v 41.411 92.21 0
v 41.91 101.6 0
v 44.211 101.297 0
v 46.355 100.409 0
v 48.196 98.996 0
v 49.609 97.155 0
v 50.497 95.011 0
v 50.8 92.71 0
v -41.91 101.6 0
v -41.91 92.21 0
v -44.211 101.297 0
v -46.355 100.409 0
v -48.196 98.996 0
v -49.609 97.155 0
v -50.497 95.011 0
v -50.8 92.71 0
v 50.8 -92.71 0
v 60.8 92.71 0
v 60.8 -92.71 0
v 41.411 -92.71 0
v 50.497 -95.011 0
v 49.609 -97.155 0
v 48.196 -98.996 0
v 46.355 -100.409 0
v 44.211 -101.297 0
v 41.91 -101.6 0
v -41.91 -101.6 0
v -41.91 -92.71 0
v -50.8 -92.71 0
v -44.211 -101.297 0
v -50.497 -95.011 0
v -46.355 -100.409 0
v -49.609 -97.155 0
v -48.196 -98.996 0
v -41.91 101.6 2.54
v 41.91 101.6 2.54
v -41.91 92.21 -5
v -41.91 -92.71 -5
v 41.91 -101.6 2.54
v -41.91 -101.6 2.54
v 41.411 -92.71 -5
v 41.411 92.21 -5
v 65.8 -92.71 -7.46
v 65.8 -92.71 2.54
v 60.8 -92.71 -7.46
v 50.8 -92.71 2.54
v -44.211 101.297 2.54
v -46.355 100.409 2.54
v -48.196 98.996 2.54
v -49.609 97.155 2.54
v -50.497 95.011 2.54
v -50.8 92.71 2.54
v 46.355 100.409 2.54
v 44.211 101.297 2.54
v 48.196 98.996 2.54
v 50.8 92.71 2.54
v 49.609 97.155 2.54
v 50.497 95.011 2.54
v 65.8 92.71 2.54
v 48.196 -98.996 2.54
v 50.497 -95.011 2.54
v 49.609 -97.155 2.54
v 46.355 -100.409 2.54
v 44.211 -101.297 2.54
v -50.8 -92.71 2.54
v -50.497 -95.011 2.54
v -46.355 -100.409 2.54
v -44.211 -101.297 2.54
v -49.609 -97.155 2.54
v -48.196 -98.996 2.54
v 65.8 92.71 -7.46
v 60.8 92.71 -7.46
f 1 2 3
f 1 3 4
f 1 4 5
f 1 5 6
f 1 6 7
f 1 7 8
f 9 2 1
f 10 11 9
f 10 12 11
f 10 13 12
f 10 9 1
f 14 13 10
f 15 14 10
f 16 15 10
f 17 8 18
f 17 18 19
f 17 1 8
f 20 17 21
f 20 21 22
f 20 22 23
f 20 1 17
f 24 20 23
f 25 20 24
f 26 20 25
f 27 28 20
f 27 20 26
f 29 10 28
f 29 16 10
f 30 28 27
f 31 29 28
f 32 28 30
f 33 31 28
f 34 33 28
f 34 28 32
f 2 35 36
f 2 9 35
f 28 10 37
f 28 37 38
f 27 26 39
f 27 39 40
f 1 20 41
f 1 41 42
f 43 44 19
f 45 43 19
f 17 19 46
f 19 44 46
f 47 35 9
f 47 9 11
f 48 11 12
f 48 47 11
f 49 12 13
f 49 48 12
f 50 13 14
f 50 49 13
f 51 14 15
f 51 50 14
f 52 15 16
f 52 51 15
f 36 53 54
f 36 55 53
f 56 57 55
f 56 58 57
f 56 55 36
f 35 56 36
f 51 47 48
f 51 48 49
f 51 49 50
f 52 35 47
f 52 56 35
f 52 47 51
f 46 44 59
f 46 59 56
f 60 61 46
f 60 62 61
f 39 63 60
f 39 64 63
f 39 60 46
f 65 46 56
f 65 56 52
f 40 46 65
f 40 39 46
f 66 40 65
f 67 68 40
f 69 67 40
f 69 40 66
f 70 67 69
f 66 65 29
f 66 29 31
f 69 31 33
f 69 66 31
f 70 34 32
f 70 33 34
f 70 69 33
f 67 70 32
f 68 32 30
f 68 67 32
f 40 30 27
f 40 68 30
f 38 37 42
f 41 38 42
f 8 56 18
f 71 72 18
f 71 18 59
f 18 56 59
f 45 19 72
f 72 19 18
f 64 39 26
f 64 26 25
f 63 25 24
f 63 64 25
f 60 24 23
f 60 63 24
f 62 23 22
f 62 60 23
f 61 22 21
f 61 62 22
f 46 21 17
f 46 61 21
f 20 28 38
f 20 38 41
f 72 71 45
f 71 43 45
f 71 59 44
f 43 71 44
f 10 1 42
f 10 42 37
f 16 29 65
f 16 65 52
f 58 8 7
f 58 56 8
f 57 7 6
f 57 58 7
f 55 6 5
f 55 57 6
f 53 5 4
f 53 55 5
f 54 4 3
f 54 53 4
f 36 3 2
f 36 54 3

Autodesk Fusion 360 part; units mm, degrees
sketch "Sketch1" plane through (0, 0, 0) normal (0, 0, 1) x (1, 0, 0)
  line L0 (-50.8, 101.6) -> (50.8, 101.6)
  line L1 (50.8, 101.6) -> (50.8, -101.6)
  line L2 (50.8, -101.6) -> (-50.8, -101.6)
  line L3 (-50.8, -101.6) -> (-50.8, 101.6)
  line L4 (-50.8, 101.6) -> (50.8, -101.6) construction
  line L5 (50.8, 101.6) -> (-50.8, -101.6) construction
  dimension "d1" = 101.6
  dimension "d2" = 203.2
extrude "Extrude1" add sketch "Sketch1" along normal blind 2.54
fillet "Fillet1" radius 8.89 4 edges at (-50.8, -101.6, 1.27) (50.8, -101.6, 1.27) (50.8, 101.6, 1.27) (-50.8, 101.6, 1.27)
extrude "Extrude4" add 1 faces at (50.8, 30.9033, 0.8467) along direction (1, 0, 0) blind 10
sketch "Sketch3" plane through (0, 0, 2.54) normal (0, 0, 1) x (-1, 0, 0)
  arc A0 (41.91, -101.6) -> (50.8, -92.71) centre (41.91, -92.71) ccw
  line L0 (50.8, -92.71) -> (50.8, 92.71)
  arc A1 (50.8, 92.71) -> (41.91, 101.6) centre (41.91, 92.71) ccw
  line L1 (41.91, 101.6) -> (-41.91, 101.6)
  arc A2 (-41.91, 101.6) -> (-50.8, 92.71) centre (-41.91, 92.71) ccw
  line L2 (-50.8, 92.71) -> (-60.8, 92.71)
  line L3 (-60.8, 92.71) -> (-60.8, -92.71)
  line L4 (-60.8, -92.71) -> (-50.8, -92.71)
  arc A3 (-50.8, -92.71) -> (-41.91, -101.6) centre (-41.91, -92.71) ccw
  line L5 (-41.91, -101.6) -> (41.91, -101.6)
  line L6 (-60.8, -92.71) -> (-65.8, -92.71)
  line L7 (-65.8, -92.71) -> (-65.8, 92.71)
  line L8 (-65.8, 92.71) -> (-60.8, 92.71)
  line L9 (-60.8, 92.71) -> (-60.8, -92.71)
  dimension "d28" = 5
extrude "Extrude5" add sketch "Sketch3" against normal blind 10 contours L3 L6 L7 L8 L9
sketch "Sketch4" plane through (0, 0, 0) normal (0, 0, -1) x (1, 0, 0)
  arc A0 (-50.8, -92.71) -> (-41.91, -101.6) centre (-41.91, -92.71) ccw
  line L0 (-41.91, -101.6) -> (41.91, -101.6)
  arc A1 (41.91, -101.6) -> (50.8, -92.71) centre (41.91, -92.71) ccw
  line L1 (50.8, -92.71) -> (60.8, -92.71)
  line L2 (60.8, -92.71) -> (60.8, 92.71)
  line L3 (60.8, 92.71) -> (50.8, 92.71)
  arc A2 (50.8, 92.71) -> (41.91, 101.6) centre (41.91, 92.71) ccw
  line L4 (41.91, 101.6) -> (-41.91, 101.6)
  arc A3 (-41.91, 101.6) -> (-50.8, 92.71) centre (-41.91, 92.71) ccw
  line L5 (-50.8, 92.71) -> (-50.8, -92.71)
  line L6 (50.8, -92.71) -> (50.8, 92.71) construction
  line L7 (-41.91, 92.71) -> (41.4111, 92.71)
  line L8 (41.4111, 92.71) -> (41.4111, -92.21)
  line L9 (41.4111, -92.21) -> (-41.91, -92.21)
  line L10 (-41.91, -92.21) -> (-41.91, 92.71)
  line L11 (-41.91, 92.71) -> (41.4111, -92.21) construction
  line L12 (41.4111, 92.71) -> (-41.91, -92.21) construction
  point P0 (-0.2495, 0.25)
  dimension "d32" = 184.92
  dimension "d36" = 83.3211
extrude "Extrude6" add sketch "Sketch4" along normal blind 5 contours L7 L8 L9 L10
equation "d32 = 185.42 mm - 0.5 mm"
equation "d36 = 83.82109398 mm - 0.5 mm"
